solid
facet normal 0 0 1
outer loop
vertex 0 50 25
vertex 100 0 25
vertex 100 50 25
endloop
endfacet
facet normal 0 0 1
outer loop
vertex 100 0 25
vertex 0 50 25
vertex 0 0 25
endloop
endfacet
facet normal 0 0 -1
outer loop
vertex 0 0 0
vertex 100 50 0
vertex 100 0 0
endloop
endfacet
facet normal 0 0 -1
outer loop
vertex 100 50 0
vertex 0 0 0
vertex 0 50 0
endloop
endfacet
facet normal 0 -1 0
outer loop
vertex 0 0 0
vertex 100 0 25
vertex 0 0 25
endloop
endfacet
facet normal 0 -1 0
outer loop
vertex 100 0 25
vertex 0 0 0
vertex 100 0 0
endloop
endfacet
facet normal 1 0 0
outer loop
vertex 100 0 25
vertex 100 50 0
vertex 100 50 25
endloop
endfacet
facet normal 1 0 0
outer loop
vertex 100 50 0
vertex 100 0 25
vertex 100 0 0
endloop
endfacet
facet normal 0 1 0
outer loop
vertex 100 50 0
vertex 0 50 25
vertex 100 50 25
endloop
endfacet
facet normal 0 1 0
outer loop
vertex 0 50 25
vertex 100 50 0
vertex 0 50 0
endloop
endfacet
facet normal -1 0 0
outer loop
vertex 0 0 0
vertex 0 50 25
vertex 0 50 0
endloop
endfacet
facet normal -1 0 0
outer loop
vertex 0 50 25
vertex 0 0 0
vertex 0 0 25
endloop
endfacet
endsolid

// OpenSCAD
module_width=100;
module_height=50;

margin=0.002;

//placeholder to cut out space for the relay timer module
module module_placeholder(module_width, module_height, module_depth=25) {
    cube([module_width, module_height, module_depth]);
}

//overall box

//cut outs for power cables

//brackets with mounting holes

//cut in half

//lip to fit one half into the other (include a channel for a seal?

//screw posts in bottom half

//screw holes in top half

module_placeholder(module_width, module_height);

/*inner_diameter=760;
pond_thickness=39;
wall_thickness=2;
margin=0.002;
total_arc=8;
rim_height=3*25.4;
*/

/*color("#BBBBBB")
difference() {
    linear_extrude(height=rim_height+wall_thickness, center=false)
        arc((inner_diameter/2)-wall_thickness, (inner_diameter+2*pond_thickness)/2+wall_thickness, 0, total_arc);
    translate([0,0,-margin]) pond_rim();
}

color("#BBBBBB")
translate([inner_diameter/2+pond_thickness/2-10, 0, rim_height+wall_thickness-margin])
    clamp_mount(10, 54, 30);

module clamp_mount(base_width, base_length, height) {
    cube([base_width, base_length, height]);
}

module pond_rim() {
    linear_extrude(height=3*25.4, center=false) {
        arc(inner_diameter/2, (inner_diameter+2*pond_thickness)/2, 0-margin, total_arc+margin);
    }
}

module arc(r1, r2, a1, a2, $fn=128) {
  r0 = min(r1, r2);
  r  = max(r1, r2);

  a = (a1 % 360 + 360) % 360;
  b = (a2 % 360 + 360) % 360;
  d = (b - a) % 360;
  s = d < 0 ? d + 360 : d;       // sweep in [0,360)

  if (s == 0) {
      difference() {
          circle(r=r, $fn=$fn);
          if (r0 > 0) circle(r=r0, $fn=$fn);
      }
  } else {
      k = max(3, ceil($fn * s / 360));
      outer = [ for (i=[0:k]) [ r  * cos(a + s*i/k), r  * sin(a + s*i/k) ] ];
      inner = [ for (i=[0:k]) [ r0 * cos(b - s*i/k), r0 * sin(b - s*i/k) ] ];
      polygon(concat(outer, inner));
  }
} */
